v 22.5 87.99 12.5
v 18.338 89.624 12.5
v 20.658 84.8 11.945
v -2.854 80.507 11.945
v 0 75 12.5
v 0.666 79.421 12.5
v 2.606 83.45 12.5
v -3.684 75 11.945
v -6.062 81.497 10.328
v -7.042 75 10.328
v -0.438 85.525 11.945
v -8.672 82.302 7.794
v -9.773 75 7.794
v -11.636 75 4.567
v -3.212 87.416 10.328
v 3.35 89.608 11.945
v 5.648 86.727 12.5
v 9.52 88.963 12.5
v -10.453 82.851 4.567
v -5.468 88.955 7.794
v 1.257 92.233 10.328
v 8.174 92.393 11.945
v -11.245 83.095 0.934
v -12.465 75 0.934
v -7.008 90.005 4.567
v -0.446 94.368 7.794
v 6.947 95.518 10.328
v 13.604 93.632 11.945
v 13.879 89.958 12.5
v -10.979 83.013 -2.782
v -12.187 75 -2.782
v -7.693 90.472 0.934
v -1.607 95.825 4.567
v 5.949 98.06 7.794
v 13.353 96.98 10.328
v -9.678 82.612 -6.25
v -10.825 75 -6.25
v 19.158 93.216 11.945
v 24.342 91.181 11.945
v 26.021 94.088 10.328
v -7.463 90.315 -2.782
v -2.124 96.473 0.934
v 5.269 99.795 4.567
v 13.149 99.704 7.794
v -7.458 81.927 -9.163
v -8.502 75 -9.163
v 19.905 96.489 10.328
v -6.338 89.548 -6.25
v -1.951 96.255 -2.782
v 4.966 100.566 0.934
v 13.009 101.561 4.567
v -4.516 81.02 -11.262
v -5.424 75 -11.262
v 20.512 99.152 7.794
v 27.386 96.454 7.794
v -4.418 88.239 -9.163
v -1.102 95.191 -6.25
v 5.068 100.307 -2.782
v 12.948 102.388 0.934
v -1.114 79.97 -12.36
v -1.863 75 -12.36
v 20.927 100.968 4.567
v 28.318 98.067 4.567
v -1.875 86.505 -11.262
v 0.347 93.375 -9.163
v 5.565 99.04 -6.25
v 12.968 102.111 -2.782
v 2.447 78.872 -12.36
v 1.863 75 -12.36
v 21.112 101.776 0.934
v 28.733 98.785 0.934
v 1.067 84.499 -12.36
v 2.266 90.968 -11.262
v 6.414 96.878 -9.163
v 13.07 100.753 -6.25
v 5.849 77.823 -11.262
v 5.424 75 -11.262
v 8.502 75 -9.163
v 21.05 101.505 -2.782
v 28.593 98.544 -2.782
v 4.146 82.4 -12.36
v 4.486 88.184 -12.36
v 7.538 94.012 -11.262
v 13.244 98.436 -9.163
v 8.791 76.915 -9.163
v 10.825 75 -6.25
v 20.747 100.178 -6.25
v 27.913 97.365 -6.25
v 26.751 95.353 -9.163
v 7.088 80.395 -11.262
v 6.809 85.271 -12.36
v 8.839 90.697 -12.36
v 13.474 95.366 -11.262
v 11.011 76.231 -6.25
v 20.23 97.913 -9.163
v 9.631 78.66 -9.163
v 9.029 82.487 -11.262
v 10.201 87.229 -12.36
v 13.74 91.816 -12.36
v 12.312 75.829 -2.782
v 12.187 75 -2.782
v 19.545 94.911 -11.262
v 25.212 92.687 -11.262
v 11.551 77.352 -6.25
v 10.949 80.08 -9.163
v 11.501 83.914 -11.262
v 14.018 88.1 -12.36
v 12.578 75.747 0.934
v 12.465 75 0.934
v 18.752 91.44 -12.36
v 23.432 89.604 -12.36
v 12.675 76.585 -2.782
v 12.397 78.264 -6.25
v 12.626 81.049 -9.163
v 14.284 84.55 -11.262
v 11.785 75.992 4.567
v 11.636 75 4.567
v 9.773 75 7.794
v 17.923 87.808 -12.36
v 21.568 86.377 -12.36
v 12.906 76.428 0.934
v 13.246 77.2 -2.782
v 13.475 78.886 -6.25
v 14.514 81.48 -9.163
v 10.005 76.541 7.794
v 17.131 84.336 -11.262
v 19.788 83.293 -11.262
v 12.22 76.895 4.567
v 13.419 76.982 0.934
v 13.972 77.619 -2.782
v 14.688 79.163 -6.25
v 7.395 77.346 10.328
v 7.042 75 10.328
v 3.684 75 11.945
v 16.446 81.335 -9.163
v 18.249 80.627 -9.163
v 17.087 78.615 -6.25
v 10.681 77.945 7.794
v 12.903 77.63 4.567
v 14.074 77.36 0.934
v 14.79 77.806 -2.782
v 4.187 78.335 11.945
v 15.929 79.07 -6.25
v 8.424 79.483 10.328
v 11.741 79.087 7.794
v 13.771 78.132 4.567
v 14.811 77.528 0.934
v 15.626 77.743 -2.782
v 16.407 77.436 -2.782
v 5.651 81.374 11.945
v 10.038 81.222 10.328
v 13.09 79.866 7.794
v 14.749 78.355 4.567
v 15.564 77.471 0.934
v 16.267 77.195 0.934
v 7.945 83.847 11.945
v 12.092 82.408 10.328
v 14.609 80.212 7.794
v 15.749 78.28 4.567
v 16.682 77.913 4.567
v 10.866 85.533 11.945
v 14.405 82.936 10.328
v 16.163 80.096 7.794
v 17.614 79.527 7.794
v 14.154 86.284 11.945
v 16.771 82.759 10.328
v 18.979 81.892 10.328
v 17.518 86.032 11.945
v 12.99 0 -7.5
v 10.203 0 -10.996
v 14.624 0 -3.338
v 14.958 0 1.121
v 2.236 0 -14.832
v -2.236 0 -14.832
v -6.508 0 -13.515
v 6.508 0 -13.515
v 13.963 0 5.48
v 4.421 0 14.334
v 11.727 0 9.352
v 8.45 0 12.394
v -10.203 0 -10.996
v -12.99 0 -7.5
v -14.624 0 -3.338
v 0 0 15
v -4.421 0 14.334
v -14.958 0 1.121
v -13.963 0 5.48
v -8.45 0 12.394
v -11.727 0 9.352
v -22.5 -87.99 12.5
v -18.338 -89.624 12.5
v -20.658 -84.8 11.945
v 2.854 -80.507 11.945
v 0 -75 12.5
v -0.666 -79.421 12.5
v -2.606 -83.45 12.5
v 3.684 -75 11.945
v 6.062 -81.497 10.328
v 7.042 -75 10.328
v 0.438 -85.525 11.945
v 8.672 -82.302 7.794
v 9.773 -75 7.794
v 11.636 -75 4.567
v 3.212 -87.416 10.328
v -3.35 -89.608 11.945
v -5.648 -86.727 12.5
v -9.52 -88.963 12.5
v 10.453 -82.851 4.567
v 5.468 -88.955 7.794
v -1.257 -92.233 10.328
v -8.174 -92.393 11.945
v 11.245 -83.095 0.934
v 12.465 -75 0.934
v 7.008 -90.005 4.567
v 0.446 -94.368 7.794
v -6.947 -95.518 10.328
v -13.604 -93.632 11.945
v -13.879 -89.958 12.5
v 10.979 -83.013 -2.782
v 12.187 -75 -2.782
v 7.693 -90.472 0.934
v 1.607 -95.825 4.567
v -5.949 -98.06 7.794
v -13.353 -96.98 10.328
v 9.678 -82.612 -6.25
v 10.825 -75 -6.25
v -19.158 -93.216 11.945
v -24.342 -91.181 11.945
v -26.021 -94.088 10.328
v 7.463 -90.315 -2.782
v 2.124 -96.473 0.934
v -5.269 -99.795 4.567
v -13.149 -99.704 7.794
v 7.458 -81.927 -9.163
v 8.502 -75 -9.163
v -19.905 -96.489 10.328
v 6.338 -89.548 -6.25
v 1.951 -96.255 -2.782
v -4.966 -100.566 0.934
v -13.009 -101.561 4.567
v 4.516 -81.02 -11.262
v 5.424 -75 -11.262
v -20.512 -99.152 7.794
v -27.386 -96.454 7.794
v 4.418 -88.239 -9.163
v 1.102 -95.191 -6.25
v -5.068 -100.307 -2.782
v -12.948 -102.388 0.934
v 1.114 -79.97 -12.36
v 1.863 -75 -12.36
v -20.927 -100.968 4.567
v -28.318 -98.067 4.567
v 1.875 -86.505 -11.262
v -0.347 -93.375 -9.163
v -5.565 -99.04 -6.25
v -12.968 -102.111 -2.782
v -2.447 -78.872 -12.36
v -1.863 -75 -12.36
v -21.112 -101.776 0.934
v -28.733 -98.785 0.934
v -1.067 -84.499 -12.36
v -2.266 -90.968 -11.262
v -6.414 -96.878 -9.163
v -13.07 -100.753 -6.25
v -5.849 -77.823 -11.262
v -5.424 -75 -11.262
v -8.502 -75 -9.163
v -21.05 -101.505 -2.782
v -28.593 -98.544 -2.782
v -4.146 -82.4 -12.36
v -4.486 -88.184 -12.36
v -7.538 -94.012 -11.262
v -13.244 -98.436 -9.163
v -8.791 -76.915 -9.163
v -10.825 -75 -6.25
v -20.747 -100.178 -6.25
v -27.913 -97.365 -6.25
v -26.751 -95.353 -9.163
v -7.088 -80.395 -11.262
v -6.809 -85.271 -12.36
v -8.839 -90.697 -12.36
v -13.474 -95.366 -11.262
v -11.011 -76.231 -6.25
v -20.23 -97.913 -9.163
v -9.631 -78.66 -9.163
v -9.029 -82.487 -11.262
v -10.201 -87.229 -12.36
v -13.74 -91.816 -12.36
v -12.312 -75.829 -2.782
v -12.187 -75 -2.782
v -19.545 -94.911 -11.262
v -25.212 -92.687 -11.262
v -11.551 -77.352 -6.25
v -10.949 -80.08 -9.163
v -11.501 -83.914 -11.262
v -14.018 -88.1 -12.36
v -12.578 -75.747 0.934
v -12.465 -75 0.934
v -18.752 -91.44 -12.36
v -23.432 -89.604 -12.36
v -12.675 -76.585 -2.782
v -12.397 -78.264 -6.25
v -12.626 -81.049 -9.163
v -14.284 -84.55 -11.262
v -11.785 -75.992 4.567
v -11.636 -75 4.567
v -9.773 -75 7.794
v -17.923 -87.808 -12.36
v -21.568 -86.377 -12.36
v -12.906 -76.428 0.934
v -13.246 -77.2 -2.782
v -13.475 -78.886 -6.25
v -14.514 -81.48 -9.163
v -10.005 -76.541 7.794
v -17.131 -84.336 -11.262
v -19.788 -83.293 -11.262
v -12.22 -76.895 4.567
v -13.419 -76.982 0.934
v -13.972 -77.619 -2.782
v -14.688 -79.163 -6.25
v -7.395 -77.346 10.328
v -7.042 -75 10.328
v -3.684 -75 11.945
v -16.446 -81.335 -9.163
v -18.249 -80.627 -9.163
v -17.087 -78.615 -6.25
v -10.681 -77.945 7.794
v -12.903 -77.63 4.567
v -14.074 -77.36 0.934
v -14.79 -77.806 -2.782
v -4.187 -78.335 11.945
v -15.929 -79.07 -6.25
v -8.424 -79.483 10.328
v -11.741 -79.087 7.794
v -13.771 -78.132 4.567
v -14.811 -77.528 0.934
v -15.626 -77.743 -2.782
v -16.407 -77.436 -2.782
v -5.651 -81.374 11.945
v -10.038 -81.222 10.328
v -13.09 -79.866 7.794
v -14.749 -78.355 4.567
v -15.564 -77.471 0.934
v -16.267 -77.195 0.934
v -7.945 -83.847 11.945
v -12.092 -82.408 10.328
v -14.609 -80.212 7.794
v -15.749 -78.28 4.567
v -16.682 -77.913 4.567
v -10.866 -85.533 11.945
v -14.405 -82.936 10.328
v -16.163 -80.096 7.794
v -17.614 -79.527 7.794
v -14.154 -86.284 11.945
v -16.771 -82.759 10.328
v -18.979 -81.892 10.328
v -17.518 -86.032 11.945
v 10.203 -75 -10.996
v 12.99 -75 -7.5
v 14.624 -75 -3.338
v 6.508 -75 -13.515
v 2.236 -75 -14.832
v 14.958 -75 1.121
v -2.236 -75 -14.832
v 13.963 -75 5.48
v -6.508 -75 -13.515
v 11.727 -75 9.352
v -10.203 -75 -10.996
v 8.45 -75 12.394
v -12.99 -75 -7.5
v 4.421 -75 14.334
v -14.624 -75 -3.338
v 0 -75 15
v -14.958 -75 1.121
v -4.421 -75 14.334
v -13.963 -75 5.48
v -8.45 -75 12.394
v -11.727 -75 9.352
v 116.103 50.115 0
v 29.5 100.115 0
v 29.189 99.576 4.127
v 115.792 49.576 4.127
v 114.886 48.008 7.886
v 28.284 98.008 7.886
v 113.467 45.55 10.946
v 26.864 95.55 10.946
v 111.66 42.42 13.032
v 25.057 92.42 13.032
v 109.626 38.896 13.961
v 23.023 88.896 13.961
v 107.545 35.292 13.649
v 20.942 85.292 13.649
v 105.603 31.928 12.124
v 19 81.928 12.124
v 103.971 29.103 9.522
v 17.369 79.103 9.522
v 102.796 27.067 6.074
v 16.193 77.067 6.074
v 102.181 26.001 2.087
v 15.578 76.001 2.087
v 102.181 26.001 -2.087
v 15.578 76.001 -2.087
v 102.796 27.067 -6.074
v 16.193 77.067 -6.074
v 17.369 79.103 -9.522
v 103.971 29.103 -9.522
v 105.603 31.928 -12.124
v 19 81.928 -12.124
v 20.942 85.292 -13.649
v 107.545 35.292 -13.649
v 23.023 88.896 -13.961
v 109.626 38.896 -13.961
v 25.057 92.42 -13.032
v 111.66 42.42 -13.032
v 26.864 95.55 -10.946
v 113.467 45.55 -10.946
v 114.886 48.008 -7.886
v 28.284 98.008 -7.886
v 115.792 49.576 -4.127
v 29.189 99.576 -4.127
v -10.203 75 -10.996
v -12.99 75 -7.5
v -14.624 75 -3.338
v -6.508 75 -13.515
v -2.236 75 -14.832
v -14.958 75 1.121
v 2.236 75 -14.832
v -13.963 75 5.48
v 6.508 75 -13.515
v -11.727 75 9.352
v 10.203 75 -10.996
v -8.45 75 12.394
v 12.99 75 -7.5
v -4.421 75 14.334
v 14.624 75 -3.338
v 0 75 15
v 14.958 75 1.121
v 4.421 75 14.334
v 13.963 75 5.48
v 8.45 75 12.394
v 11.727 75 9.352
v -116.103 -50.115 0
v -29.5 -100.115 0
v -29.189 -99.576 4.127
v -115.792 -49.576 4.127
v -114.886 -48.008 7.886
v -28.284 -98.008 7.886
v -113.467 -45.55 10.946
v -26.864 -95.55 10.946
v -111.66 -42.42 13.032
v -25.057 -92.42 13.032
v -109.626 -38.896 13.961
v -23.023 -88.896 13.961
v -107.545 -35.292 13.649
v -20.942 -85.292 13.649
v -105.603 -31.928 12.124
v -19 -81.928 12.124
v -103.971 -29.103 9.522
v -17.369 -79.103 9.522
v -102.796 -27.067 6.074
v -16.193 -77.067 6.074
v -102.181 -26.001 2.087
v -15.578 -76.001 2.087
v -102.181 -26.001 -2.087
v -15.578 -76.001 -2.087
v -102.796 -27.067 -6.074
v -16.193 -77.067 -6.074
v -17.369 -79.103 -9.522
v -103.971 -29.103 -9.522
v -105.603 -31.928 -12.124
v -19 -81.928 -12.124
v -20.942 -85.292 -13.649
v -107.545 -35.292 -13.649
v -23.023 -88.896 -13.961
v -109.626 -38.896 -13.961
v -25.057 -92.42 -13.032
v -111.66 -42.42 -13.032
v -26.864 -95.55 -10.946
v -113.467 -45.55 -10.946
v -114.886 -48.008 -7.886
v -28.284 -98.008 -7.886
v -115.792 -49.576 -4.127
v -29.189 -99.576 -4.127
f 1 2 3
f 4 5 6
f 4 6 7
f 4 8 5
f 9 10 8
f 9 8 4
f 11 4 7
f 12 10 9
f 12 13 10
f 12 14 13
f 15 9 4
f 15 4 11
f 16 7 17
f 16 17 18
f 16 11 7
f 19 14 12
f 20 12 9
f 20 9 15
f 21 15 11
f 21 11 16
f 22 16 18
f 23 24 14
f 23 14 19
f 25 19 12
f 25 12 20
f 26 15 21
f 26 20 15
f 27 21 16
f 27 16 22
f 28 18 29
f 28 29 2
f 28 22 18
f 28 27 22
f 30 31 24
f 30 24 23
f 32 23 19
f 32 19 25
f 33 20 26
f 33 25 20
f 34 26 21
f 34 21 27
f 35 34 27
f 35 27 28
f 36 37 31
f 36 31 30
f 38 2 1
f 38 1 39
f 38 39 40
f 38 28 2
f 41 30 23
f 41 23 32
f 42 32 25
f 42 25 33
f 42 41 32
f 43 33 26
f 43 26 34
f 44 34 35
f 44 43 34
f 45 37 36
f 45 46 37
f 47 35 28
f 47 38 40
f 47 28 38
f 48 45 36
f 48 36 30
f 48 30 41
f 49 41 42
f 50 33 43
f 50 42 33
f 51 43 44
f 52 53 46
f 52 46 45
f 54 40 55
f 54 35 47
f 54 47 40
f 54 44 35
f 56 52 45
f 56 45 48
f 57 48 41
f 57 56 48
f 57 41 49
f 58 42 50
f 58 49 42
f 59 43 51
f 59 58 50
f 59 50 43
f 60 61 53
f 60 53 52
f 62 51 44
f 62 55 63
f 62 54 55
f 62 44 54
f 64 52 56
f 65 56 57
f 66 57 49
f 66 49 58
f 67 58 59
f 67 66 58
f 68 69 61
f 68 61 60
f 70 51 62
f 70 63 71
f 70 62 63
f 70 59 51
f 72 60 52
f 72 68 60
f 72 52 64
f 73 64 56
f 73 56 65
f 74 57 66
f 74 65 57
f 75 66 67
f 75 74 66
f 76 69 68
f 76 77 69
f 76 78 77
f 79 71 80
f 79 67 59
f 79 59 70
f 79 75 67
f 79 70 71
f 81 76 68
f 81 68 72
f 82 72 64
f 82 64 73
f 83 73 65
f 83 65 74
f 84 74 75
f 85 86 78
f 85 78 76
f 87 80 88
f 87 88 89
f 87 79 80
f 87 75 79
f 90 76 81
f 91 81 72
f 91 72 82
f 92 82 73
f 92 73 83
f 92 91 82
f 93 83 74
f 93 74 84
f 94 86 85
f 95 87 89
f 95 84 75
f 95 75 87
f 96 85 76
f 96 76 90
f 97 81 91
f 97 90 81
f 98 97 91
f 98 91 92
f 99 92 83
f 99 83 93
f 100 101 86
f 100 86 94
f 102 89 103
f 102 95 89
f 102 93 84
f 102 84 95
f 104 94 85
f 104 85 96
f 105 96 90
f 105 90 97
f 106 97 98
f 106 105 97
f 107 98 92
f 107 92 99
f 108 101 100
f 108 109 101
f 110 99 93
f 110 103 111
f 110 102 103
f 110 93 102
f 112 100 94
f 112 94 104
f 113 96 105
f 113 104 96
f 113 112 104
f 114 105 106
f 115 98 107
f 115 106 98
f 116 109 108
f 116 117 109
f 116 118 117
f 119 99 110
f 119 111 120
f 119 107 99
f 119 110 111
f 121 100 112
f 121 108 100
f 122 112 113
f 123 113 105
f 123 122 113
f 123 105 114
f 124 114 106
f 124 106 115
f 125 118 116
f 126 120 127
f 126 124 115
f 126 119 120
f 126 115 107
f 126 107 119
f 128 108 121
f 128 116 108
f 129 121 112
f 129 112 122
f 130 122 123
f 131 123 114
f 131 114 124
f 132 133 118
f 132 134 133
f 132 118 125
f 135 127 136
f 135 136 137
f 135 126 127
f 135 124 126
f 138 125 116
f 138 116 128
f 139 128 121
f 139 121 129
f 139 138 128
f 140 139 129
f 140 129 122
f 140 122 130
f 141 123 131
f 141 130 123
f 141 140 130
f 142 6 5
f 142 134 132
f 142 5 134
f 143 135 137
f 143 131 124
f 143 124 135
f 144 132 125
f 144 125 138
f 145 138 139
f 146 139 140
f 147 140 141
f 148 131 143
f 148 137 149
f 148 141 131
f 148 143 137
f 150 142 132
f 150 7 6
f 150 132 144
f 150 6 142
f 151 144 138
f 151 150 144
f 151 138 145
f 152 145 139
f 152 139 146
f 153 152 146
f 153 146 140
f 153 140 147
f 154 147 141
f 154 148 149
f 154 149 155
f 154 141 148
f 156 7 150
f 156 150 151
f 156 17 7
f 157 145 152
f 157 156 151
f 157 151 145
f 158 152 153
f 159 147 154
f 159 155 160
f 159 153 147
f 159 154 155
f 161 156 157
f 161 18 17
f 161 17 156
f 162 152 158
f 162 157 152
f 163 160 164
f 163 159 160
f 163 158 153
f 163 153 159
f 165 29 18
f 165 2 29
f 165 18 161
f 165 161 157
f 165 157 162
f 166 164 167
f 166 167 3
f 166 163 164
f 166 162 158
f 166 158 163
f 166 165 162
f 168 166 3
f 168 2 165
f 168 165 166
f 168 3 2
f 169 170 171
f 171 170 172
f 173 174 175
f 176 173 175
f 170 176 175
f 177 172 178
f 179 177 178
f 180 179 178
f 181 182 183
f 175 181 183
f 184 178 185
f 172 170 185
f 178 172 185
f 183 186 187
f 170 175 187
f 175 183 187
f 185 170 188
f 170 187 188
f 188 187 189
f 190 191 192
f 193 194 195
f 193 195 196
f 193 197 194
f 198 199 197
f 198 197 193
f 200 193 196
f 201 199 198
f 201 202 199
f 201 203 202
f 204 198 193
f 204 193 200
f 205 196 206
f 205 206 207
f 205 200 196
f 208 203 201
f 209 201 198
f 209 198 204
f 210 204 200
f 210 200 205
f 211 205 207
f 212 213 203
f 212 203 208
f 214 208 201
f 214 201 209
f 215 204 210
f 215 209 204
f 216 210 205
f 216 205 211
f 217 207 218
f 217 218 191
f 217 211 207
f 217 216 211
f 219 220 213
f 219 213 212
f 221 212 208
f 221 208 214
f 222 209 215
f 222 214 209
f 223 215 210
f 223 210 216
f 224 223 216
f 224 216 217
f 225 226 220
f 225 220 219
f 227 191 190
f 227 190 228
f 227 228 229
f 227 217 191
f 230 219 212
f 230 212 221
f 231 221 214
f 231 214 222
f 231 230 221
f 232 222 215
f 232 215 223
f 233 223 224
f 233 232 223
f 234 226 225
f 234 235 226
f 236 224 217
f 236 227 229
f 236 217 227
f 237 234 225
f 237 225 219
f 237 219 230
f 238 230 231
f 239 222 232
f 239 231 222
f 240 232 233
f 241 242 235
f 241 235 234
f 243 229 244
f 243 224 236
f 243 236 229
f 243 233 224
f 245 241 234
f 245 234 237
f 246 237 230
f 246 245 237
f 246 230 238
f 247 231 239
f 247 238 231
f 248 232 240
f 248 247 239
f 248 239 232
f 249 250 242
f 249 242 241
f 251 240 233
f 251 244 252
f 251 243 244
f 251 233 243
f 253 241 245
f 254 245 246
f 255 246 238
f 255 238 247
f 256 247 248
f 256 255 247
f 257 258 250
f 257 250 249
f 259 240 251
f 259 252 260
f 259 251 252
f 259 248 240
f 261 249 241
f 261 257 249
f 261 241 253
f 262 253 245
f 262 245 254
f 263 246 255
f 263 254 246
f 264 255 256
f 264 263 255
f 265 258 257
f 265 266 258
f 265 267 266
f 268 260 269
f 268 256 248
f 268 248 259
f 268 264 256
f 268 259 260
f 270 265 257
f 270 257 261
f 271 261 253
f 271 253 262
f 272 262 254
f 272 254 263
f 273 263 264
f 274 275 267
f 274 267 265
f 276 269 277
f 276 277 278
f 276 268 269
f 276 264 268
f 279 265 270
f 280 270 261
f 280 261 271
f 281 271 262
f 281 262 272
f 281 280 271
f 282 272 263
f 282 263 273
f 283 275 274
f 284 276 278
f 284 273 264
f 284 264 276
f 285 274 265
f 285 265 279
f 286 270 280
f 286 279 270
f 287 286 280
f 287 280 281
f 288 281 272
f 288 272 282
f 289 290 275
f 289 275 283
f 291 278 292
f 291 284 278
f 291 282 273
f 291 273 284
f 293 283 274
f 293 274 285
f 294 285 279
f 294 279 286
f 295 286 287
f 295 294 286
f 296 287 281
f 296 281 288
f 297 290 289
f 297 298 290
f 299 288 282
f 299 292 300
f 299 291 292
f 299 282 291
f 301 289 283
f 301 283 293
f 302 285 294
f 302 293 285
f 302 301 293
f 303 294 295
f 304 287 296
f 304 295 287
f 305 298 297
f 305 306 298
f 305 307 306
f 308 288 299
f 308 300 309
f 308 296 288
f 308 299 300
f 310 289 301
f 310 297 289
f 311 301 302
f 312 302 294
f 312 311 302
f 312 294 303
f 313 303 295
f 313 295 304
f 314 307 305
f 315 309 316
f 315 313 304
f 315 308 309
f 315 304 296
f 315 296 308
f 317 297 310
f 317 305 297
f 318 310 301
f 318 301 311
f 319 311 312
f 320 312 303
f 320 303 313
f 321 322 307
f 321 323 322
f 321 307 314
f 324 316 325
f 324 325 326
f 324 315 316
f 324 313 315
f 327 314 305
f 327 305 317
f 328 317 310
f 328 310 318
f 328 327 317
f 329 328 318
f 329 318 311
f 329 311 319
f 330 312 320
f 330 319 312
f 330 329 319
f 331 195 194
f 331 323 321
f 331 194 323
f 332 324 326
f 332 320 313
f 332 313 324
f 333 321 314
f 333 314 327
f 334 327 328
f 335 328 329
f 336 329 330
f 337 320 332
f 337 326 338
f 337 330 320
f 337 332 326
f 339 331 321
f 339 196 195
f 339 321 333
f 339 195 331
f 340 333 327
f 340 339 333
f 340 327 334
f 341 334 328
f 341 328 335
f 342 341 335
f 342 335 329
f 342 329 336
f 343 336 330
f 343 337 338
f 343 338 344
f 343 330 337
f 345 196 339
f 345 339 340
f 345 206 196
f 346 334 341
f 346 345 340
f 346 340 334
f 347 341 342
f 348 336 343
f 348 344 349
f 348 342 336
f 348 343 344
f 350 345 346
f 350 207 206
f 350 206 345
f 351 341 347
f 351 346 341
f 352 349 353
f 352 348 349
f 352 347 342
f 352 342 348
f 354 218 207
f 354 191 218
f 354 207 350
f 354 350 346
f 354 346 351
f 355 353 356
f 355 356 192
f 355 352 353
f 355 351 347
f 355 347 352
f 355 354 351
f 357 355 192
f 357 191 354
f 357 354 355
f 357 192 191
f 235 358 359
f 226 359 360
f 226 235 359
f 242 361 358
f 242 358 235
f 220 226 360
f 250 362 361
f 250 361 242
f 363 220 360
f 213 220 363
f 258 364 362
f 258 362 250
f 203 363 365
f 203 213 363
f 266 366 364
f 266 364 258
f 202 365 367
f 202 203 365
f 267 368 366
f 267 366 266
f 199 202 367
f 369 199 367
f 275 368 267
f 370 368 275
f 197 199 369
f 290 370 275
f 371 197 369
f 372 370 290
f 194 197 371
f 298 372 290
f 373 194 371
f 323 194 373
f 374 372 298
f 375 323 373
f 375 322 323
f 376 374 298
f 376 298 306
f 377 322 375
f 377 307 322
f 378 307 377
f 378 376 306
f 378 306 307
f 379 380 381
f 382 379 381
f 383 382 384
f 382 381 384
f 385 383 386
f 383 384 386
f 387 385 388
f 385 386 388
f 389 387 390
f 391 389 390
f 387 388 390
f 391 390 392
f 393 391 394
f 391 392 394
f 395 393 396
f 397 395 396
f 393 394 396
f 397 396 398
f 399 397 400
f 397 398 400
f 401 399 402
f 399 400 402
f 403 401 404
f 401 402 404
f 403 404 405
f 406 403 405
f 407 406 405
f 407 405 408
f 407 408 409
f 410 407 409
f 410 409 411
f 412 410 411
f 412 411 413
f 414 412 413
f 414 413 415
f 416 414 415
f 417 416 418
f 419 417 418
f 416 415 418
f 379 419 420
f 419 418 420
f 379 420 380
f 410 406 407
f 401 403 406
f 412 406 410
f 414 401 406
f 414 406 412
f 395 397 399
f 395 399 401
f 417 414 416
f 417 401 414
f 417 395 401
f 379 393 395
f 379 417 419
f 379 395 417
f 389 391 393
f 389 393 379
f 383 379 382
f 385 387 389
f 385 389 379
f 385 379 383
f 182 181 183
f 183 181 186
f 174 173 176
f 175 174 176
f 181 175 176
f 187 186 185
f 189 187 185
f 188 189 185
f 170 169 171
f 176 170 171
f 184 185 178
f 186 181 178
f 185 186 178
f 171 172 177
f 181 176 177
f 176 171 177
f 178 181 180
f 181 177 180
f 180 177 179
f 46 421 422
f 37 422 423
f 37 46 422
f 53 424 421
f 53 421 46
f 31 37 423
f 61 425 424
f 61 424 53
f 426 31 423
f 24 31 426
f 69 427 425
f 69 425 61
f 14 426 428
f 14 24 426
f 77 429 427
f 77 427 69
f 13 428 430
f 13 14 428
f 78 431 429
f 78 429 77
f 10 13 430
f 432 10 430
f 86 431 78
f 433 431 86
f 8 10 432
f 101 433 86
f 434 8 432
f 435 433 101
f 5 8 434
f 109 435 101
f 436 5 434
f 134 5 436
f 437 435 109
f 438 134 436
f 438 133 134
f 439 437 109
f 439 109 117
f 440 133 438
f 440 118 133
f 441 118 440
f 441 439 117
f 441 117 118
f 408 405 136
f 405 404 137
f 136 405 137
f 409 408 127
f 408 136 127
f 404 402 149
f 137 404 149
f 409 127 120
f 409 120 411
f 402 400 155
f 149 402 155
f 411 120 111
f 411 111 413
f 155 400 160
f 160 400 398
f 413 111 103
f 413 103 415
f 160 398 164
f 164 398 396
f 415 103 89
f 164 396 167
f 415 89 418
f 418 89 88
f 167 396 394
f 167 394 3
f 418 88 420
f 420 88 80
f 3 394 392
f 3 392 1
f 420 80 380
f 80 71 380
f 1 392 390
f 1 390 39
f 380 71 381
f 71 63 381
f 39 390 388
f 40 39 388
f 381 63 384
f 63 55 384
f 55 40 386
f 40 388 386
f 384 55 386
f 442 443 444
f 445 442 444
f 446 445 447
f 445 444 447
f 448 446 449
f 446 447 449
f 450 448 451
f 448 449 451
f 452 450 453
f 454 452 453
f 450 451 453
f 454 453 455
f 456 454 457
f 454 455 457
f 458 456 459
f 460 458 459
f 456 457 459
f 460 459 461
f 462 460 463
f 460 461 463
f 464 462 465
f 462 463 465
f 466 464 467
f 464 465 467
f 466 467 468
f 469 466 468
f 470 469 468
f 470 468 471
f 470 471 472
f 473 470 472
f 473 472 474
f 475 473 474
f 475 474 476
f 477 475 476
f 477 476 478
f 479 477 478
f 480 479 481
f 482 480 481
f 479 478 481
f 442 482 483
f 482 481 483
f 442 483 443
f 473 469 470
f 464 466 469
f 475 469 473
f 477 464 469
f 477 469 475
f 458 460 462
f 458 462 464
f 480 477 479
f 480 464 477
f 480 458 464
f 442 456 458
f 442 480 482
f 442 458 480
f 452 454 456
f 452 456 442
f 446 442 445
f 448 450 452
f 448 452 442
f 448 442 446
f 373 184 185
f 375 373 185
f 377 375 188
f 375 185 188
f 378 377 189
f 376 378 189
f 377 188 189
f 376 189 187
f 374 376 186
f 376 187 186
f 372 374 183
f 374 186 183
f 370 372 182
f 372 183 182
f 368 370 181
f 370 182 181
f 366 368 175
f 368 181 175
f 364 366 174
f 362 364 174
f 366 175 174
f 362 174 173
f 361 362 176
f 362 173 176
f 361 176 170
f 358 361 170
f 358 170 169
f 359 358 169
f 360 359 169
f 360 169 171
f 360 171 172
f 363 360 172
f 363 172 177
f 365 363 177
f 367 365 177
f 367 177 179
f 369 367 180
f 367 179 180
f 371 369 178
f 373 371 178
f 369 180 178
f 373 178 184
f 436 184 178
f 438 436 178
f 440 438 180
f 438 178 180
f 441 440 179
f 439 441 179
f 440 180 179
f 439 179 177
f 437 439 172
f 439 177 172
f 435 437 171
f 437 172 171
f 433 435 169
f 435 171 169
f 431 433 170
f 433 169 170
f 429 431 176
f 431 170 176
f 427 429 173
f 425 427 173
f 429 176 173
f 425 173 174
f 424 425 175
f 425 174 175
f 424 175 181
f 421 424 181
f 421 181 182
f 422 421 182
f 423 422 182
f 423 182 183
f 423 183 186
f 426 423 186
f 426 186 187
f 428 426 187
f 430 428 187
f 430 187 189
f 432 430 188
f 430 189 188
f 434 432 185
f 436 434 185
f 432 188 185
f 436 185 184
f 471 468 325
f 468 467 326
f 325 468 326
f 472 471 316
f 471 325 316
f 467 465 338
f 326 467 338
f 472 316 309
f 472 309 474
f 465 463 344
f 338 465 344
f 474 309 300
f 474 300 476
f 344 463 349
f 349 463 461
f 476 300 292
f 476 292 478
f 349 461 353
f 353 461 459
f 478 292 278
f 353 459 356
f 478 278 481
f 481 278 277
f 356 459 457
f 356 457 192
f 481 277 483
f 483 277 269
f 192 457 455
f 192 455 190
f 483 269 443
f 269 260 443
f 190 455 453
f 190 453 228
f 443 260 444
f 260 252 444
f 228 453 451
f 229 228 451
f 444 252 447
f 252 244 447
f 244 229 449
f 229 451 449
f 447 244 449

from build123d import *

# Parameters (mm, degrees)
SKETCH_1_R      = 15
EXTRUDE_1_DEPTH = 75
SKETCH_10_R     = 12.5
SKETCH_13_R     = 14
EXTRUDE_7_DEPTH = 100


with BuildPart() as part:
    # 草图1 → 凸台-拉伸1 (new body)
    with BuildSketch(Plane(origin=(0, 0, 0), x_dir=(1, 0, 0), z_dir=(0, 1, 0))):
        with Locations(Location((0, 0, 0), (0, 0, 270))):
            Circle(SKETCH_1_R)
    extrude(amount=EXTRUDE_1_DEPTH)

    # 扫描1: sweep along a path in 草图9
    with BuildLine(Plane.XY) as sweep_1_path:
        ThreePointArc((0, 75), (7.5, 87.990381057), (22.5, 87.990381057))
    # 草图10 → 扫描1 (sweep)
    with BuildSketch(Plane(origin=(-21.225952642, 12.254809472, 0), x_dir=(0, 0, 1), z_dir=(-0.8660254037844399, 0.4999999999999978, 0))):
        with Locations((0, 87.451905284)):
            Circle(SKETCH_10_R)
    sweep(path=sweep_1_path.line)

    # 草图13 → 凸台-拉伸7 (add)
    with BuildSketch(Plane(origin=(-21.225952642, 12.254809472, 0), x_dir=(0, 0, -1), z_dir=(0.86602540378444, -0.49999999999999784, 0))):
        with Locations(Location((0, 87.451905284, 0), (0, 0, 90))):
            Circle(SKETCH_13_R)
    extrude(amount=EXTRUDE_7_DEPTH)


with BuildPart() as body_2:
    # 镜向14: mirrored copy
    add(part.part.mirror(Plane.ZX))


with BuildPart() as body_3:
    # 镜向15: mirrored copy
    add(body_2.part.mirror(Plane(origin=(0, 0, 0), x_dir=(0, 0, 1), z_dir=(1, 0, 0))))


solid = Compound([part.part, body_3.part])
